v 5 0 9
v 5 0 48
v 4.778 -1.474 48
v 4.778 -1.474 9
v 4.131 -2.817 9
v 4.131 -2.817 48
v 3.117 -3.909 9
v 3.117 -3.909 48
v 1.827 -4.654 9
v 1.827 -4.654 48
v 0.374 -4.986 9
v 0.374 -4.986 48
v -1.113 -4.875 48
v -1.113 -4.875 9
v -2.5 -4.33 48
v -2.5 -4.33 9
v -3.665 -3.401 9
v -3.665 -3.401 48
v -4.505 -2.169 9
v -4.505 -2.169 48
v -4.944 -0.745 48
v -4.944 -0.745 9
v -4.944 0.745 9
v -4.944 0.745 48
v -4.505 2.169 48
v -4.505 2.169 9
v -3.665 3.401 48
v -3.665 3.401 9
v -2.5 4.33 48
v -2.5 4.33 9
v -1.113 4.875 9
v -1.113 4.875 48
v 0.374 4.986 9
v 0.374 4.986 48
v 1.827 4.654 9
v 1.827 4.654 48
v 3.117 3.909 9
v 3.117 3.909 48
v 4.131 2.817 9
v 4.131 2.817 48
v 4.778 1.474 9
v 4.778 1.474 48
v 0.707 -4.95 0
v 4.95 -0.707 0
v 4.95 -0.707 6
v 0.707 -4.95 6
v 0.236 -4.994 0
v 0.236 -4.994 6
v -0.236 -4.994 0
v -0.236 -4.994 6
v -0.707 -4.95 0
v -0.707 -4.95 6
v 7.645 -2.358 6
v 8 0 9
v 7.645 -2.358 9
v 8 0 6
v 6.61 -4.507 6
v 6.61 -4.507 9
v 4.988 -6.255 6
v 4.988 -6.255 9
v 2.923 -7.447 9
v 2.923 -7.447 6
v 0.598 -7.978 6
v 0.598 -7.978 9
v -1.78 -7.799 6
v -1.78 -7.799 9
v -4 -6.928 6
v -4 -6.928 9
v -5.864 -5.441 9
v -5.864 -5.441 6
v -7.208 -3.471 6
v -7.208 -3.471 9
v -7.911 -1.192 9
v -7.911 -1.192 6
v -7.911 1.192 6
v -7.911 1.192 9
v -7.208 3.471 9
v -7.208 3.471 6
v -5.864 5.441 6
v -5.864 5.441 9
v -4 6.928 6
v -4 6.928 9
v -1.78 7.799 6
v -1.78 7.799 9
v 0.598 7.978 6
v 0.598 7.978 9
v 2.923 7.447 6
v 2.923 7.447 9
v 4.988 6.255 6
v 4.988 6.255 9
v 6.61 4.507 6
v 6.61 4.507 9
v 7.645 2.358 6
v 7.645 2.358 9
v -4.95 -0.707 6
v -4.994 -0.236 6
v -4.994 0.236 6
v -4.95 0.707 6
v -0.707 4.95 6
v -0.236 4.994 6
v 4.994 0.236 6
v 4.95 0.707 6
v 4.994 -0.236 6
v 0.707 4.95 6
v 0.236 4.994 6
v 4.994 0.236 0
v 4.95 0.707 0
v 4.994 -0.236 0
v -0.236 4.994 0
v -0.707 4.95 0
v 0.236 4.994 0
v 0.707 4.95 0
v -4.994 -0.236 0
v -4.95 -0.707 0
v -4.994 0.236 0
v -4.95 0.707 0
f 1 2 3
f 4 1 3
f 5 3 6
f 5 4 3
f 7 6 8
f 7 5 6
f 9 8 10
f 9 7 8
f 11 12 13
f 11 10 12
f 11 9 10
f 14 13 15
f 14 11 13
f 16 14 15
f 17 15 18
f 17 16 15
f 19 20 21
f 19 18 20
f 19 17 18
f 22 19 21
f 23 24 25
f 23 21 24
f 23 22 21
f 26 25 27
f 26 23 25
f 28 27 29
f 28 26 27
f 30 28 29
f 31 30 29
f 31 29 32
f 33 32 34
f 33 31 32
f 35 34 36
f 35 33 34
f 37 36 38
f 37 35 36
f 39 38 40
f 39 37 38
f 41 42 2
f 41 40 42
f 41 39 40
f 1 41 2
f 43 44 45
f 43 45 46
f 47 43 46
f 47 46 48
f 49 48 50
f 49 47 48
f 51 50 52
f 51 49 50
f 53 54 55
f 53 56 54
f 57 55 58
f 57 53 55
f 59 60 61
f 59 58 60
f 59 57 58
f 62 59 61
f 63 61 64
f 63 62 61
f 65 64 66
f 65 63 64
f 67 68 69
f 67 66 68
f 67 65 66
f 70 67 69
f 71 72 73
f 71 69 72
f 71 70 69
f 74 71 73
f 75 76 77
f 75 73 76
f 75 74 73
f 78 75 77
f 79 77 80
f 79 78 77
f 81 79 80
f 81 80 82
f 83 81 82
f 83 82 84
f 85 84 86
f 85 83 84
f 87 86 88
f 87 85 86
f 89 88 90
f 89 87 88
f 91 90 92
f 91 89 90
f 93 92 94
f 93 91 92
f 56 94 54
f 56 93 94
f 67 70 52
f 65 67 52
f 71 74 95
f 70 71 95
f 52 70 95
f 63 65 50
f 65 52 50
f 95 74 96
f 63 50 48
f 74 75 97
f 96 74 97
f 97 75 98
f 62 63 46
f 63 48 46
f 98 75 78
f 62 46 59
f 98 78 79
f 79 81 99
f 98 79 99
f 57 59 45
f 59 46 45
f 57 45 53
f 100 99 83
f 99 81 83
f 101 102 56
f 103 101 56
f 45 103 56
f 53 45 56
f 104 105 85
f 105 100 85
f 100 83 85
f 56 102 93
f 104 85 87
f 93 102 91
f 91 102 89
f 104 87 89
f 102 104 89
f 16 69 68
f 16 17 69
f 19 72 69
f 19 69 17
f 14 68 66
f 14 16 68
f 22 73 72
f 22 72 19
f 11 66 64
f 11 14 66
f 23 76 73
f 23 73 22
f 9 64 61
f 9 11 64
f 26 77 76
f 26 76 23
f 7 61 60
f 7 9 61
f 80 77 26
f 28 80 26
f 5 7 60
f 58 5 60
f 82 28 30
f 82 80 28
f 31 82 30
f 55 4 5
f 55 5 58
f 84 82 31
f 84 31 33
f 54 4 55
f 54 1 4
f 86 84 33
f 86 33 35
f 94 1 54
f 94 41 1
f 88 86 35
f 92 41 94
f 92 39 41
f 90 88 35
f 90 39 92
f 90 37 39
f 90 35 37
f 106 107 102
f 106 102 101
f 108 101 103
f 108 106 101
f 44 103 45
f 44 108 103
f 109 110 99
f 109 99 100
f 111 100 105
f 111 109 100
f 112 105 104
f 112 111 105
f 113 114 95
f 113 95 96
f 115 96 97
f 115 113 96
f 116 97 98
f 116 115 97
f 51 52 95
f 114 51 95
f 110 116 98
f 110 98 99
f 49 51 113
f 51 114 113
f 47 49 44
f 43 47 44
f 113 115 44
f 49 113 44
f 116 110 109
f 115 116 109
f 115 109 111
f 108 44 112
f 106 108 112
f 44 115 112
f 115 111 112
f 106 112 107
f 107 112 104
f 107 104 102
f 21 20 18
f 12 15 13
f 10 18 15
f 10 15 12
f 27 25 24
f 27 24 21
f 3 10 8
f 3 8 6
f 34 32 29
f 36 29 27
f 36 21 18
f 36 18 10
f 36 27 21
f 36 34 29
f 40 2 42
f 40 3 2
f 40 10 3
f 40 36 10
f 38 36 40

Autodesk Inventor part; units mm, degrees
ref_plane "YZ Plane" through (0, 0, 0) normal (1, 0, 0) x (0, 1, 0)
ref_plane "XZ Plane" through (0, 0, 0) normal (0, 1, 0) x (-1, 0, 0)
ref_plane "XY Plane" through (0, 0, 0) normal (0, 0, 1) x (1, 0, 0)
sketch "Эскиз1" plane through (0, 0, 0) normal (0, 0, 1) x (1, 0, 0)
  circle A0 centre (0, 0) radius 5
  dimension "d0" = 10
extrude "Выдавливание1" add sketch "Эскиз1" along normal blind 6
sketch "Эскиз2" plane through (0, 0, 6) normal (0, 0, 1) x (1, 0, 0)
  circle A0 centre (0, 0) radius 5 projected
  line L0 (0, 5.6569) -> (5.6569, 0)
  line L1 (5.6569, 0) -> (0, -5.6569)
  line L2 (0, -5.6569) -> (-5.6569, 0)
  line L3 (-5.6569, 0) -> (0, 5.6569)
  dimension "d3" = 8
extrude "Выдавливание2" cut sketch "Эскиз2" against normal blind 6 contours A0 L1 L2 L3 L0 | A0 L0 L1 | A0 L3 L0 | L1 L2 A0 | A0 L2 L3 keep common part
sketch "Эскиз3" plane through (0, 0, 6) normal (0, 0, 1) x (1, 0, 0)
  line L0 (-0.7071, -4.9497) -> (-4.9497, -0.7071) projected
  arc A0 (-0.7071, -4.9497) -> (0.7071, -4.9497) centre (0, 0) ccw projected
  line L1 (4.9497, -0.7071) -> (0.7071, -4.9497) projected
  arc A1 (4.9497, -0.7071) -> (4.9497, 0.7071) centre (0, 0) ccw projected
  line L2 (0.7071, 4.9497) -> (4.9497, 0.7071) projected
  arc A2 (0.7071, 4.9497) -> (-0.7071, 4.9497) centre (0, 0) ccw projected
  line L3 (-4.9497, 0.7071) -> (-0.7071, 4.9497) projected
  arc A3 (-4.9497, 0.7071) -> (-4.9497, -0.7071) centre (0, 0) ccw projected
  circle A4 centre (0, 0) radius 8
  dimension "d6" = 16
extrude "Выдавливание3" add sketch "Эскиз3" along normal blind 3
sketch "Эскиз4" plane through (0, 0, 9) normal (0, 0, 1) x (1, 0, 0)
  arc A0 (-4.9497, 0.7071) -> (-4.9497, -0.7071) centre (0, 0) ccw projected
  line L0 (-4.9497, 0.7071) -> (-0.7071, 4.9497) projected
  arc A1 (0.7071, 4.9497) -> (-0.7071, 4.9497) centre (0, 0) ccw projected
  line L1 (0.7071, 4.9497) -> (4.9497, 0.7071) projected
  arc A2 (4.9497, -0.7071) -> (4.9497, 0.7071) centre (0, 0) ccw projected
  line L2 (4.9497, -0.7071) -> (0.7071, -4.9497) projected
  arc A3 (-0.7071, -4.9497) -> (0.7071, -4.9497) centre (0, 0) ccw projected
  line L3 (-0.7071, -4.9497) -> (-4.9497, -0.7071) projected
extrude "Выдавливание4" add sketch "Эскиз4" against normal blind 3
sketch "Эскиз5" plane through (0, 0, 9) normal (0, 0, 1) x (1, 0, 0)
  circle A0 centre (0, 0) radius 8 projected
  circle A1 centre (0, 0) radius 5
  dimension "d11" = 10
extrude "Выдавливание5" add sketch "Эскиз5" along normal blind 39 contours A1
sketch "Эскиз6" plane through (0, 0, 48) normal (0, 0, 1) x (1, 0, 0)
  circle A0 centre (0, 0) radius 5 projected
sketch "Эскиз7" plane through (0, 0, 48) normal (0, 0, 1) x (1, 0, 0)
  circle A0 centre (0, 0) radius 5 projected
properties part number "Поз12 Стержень"
